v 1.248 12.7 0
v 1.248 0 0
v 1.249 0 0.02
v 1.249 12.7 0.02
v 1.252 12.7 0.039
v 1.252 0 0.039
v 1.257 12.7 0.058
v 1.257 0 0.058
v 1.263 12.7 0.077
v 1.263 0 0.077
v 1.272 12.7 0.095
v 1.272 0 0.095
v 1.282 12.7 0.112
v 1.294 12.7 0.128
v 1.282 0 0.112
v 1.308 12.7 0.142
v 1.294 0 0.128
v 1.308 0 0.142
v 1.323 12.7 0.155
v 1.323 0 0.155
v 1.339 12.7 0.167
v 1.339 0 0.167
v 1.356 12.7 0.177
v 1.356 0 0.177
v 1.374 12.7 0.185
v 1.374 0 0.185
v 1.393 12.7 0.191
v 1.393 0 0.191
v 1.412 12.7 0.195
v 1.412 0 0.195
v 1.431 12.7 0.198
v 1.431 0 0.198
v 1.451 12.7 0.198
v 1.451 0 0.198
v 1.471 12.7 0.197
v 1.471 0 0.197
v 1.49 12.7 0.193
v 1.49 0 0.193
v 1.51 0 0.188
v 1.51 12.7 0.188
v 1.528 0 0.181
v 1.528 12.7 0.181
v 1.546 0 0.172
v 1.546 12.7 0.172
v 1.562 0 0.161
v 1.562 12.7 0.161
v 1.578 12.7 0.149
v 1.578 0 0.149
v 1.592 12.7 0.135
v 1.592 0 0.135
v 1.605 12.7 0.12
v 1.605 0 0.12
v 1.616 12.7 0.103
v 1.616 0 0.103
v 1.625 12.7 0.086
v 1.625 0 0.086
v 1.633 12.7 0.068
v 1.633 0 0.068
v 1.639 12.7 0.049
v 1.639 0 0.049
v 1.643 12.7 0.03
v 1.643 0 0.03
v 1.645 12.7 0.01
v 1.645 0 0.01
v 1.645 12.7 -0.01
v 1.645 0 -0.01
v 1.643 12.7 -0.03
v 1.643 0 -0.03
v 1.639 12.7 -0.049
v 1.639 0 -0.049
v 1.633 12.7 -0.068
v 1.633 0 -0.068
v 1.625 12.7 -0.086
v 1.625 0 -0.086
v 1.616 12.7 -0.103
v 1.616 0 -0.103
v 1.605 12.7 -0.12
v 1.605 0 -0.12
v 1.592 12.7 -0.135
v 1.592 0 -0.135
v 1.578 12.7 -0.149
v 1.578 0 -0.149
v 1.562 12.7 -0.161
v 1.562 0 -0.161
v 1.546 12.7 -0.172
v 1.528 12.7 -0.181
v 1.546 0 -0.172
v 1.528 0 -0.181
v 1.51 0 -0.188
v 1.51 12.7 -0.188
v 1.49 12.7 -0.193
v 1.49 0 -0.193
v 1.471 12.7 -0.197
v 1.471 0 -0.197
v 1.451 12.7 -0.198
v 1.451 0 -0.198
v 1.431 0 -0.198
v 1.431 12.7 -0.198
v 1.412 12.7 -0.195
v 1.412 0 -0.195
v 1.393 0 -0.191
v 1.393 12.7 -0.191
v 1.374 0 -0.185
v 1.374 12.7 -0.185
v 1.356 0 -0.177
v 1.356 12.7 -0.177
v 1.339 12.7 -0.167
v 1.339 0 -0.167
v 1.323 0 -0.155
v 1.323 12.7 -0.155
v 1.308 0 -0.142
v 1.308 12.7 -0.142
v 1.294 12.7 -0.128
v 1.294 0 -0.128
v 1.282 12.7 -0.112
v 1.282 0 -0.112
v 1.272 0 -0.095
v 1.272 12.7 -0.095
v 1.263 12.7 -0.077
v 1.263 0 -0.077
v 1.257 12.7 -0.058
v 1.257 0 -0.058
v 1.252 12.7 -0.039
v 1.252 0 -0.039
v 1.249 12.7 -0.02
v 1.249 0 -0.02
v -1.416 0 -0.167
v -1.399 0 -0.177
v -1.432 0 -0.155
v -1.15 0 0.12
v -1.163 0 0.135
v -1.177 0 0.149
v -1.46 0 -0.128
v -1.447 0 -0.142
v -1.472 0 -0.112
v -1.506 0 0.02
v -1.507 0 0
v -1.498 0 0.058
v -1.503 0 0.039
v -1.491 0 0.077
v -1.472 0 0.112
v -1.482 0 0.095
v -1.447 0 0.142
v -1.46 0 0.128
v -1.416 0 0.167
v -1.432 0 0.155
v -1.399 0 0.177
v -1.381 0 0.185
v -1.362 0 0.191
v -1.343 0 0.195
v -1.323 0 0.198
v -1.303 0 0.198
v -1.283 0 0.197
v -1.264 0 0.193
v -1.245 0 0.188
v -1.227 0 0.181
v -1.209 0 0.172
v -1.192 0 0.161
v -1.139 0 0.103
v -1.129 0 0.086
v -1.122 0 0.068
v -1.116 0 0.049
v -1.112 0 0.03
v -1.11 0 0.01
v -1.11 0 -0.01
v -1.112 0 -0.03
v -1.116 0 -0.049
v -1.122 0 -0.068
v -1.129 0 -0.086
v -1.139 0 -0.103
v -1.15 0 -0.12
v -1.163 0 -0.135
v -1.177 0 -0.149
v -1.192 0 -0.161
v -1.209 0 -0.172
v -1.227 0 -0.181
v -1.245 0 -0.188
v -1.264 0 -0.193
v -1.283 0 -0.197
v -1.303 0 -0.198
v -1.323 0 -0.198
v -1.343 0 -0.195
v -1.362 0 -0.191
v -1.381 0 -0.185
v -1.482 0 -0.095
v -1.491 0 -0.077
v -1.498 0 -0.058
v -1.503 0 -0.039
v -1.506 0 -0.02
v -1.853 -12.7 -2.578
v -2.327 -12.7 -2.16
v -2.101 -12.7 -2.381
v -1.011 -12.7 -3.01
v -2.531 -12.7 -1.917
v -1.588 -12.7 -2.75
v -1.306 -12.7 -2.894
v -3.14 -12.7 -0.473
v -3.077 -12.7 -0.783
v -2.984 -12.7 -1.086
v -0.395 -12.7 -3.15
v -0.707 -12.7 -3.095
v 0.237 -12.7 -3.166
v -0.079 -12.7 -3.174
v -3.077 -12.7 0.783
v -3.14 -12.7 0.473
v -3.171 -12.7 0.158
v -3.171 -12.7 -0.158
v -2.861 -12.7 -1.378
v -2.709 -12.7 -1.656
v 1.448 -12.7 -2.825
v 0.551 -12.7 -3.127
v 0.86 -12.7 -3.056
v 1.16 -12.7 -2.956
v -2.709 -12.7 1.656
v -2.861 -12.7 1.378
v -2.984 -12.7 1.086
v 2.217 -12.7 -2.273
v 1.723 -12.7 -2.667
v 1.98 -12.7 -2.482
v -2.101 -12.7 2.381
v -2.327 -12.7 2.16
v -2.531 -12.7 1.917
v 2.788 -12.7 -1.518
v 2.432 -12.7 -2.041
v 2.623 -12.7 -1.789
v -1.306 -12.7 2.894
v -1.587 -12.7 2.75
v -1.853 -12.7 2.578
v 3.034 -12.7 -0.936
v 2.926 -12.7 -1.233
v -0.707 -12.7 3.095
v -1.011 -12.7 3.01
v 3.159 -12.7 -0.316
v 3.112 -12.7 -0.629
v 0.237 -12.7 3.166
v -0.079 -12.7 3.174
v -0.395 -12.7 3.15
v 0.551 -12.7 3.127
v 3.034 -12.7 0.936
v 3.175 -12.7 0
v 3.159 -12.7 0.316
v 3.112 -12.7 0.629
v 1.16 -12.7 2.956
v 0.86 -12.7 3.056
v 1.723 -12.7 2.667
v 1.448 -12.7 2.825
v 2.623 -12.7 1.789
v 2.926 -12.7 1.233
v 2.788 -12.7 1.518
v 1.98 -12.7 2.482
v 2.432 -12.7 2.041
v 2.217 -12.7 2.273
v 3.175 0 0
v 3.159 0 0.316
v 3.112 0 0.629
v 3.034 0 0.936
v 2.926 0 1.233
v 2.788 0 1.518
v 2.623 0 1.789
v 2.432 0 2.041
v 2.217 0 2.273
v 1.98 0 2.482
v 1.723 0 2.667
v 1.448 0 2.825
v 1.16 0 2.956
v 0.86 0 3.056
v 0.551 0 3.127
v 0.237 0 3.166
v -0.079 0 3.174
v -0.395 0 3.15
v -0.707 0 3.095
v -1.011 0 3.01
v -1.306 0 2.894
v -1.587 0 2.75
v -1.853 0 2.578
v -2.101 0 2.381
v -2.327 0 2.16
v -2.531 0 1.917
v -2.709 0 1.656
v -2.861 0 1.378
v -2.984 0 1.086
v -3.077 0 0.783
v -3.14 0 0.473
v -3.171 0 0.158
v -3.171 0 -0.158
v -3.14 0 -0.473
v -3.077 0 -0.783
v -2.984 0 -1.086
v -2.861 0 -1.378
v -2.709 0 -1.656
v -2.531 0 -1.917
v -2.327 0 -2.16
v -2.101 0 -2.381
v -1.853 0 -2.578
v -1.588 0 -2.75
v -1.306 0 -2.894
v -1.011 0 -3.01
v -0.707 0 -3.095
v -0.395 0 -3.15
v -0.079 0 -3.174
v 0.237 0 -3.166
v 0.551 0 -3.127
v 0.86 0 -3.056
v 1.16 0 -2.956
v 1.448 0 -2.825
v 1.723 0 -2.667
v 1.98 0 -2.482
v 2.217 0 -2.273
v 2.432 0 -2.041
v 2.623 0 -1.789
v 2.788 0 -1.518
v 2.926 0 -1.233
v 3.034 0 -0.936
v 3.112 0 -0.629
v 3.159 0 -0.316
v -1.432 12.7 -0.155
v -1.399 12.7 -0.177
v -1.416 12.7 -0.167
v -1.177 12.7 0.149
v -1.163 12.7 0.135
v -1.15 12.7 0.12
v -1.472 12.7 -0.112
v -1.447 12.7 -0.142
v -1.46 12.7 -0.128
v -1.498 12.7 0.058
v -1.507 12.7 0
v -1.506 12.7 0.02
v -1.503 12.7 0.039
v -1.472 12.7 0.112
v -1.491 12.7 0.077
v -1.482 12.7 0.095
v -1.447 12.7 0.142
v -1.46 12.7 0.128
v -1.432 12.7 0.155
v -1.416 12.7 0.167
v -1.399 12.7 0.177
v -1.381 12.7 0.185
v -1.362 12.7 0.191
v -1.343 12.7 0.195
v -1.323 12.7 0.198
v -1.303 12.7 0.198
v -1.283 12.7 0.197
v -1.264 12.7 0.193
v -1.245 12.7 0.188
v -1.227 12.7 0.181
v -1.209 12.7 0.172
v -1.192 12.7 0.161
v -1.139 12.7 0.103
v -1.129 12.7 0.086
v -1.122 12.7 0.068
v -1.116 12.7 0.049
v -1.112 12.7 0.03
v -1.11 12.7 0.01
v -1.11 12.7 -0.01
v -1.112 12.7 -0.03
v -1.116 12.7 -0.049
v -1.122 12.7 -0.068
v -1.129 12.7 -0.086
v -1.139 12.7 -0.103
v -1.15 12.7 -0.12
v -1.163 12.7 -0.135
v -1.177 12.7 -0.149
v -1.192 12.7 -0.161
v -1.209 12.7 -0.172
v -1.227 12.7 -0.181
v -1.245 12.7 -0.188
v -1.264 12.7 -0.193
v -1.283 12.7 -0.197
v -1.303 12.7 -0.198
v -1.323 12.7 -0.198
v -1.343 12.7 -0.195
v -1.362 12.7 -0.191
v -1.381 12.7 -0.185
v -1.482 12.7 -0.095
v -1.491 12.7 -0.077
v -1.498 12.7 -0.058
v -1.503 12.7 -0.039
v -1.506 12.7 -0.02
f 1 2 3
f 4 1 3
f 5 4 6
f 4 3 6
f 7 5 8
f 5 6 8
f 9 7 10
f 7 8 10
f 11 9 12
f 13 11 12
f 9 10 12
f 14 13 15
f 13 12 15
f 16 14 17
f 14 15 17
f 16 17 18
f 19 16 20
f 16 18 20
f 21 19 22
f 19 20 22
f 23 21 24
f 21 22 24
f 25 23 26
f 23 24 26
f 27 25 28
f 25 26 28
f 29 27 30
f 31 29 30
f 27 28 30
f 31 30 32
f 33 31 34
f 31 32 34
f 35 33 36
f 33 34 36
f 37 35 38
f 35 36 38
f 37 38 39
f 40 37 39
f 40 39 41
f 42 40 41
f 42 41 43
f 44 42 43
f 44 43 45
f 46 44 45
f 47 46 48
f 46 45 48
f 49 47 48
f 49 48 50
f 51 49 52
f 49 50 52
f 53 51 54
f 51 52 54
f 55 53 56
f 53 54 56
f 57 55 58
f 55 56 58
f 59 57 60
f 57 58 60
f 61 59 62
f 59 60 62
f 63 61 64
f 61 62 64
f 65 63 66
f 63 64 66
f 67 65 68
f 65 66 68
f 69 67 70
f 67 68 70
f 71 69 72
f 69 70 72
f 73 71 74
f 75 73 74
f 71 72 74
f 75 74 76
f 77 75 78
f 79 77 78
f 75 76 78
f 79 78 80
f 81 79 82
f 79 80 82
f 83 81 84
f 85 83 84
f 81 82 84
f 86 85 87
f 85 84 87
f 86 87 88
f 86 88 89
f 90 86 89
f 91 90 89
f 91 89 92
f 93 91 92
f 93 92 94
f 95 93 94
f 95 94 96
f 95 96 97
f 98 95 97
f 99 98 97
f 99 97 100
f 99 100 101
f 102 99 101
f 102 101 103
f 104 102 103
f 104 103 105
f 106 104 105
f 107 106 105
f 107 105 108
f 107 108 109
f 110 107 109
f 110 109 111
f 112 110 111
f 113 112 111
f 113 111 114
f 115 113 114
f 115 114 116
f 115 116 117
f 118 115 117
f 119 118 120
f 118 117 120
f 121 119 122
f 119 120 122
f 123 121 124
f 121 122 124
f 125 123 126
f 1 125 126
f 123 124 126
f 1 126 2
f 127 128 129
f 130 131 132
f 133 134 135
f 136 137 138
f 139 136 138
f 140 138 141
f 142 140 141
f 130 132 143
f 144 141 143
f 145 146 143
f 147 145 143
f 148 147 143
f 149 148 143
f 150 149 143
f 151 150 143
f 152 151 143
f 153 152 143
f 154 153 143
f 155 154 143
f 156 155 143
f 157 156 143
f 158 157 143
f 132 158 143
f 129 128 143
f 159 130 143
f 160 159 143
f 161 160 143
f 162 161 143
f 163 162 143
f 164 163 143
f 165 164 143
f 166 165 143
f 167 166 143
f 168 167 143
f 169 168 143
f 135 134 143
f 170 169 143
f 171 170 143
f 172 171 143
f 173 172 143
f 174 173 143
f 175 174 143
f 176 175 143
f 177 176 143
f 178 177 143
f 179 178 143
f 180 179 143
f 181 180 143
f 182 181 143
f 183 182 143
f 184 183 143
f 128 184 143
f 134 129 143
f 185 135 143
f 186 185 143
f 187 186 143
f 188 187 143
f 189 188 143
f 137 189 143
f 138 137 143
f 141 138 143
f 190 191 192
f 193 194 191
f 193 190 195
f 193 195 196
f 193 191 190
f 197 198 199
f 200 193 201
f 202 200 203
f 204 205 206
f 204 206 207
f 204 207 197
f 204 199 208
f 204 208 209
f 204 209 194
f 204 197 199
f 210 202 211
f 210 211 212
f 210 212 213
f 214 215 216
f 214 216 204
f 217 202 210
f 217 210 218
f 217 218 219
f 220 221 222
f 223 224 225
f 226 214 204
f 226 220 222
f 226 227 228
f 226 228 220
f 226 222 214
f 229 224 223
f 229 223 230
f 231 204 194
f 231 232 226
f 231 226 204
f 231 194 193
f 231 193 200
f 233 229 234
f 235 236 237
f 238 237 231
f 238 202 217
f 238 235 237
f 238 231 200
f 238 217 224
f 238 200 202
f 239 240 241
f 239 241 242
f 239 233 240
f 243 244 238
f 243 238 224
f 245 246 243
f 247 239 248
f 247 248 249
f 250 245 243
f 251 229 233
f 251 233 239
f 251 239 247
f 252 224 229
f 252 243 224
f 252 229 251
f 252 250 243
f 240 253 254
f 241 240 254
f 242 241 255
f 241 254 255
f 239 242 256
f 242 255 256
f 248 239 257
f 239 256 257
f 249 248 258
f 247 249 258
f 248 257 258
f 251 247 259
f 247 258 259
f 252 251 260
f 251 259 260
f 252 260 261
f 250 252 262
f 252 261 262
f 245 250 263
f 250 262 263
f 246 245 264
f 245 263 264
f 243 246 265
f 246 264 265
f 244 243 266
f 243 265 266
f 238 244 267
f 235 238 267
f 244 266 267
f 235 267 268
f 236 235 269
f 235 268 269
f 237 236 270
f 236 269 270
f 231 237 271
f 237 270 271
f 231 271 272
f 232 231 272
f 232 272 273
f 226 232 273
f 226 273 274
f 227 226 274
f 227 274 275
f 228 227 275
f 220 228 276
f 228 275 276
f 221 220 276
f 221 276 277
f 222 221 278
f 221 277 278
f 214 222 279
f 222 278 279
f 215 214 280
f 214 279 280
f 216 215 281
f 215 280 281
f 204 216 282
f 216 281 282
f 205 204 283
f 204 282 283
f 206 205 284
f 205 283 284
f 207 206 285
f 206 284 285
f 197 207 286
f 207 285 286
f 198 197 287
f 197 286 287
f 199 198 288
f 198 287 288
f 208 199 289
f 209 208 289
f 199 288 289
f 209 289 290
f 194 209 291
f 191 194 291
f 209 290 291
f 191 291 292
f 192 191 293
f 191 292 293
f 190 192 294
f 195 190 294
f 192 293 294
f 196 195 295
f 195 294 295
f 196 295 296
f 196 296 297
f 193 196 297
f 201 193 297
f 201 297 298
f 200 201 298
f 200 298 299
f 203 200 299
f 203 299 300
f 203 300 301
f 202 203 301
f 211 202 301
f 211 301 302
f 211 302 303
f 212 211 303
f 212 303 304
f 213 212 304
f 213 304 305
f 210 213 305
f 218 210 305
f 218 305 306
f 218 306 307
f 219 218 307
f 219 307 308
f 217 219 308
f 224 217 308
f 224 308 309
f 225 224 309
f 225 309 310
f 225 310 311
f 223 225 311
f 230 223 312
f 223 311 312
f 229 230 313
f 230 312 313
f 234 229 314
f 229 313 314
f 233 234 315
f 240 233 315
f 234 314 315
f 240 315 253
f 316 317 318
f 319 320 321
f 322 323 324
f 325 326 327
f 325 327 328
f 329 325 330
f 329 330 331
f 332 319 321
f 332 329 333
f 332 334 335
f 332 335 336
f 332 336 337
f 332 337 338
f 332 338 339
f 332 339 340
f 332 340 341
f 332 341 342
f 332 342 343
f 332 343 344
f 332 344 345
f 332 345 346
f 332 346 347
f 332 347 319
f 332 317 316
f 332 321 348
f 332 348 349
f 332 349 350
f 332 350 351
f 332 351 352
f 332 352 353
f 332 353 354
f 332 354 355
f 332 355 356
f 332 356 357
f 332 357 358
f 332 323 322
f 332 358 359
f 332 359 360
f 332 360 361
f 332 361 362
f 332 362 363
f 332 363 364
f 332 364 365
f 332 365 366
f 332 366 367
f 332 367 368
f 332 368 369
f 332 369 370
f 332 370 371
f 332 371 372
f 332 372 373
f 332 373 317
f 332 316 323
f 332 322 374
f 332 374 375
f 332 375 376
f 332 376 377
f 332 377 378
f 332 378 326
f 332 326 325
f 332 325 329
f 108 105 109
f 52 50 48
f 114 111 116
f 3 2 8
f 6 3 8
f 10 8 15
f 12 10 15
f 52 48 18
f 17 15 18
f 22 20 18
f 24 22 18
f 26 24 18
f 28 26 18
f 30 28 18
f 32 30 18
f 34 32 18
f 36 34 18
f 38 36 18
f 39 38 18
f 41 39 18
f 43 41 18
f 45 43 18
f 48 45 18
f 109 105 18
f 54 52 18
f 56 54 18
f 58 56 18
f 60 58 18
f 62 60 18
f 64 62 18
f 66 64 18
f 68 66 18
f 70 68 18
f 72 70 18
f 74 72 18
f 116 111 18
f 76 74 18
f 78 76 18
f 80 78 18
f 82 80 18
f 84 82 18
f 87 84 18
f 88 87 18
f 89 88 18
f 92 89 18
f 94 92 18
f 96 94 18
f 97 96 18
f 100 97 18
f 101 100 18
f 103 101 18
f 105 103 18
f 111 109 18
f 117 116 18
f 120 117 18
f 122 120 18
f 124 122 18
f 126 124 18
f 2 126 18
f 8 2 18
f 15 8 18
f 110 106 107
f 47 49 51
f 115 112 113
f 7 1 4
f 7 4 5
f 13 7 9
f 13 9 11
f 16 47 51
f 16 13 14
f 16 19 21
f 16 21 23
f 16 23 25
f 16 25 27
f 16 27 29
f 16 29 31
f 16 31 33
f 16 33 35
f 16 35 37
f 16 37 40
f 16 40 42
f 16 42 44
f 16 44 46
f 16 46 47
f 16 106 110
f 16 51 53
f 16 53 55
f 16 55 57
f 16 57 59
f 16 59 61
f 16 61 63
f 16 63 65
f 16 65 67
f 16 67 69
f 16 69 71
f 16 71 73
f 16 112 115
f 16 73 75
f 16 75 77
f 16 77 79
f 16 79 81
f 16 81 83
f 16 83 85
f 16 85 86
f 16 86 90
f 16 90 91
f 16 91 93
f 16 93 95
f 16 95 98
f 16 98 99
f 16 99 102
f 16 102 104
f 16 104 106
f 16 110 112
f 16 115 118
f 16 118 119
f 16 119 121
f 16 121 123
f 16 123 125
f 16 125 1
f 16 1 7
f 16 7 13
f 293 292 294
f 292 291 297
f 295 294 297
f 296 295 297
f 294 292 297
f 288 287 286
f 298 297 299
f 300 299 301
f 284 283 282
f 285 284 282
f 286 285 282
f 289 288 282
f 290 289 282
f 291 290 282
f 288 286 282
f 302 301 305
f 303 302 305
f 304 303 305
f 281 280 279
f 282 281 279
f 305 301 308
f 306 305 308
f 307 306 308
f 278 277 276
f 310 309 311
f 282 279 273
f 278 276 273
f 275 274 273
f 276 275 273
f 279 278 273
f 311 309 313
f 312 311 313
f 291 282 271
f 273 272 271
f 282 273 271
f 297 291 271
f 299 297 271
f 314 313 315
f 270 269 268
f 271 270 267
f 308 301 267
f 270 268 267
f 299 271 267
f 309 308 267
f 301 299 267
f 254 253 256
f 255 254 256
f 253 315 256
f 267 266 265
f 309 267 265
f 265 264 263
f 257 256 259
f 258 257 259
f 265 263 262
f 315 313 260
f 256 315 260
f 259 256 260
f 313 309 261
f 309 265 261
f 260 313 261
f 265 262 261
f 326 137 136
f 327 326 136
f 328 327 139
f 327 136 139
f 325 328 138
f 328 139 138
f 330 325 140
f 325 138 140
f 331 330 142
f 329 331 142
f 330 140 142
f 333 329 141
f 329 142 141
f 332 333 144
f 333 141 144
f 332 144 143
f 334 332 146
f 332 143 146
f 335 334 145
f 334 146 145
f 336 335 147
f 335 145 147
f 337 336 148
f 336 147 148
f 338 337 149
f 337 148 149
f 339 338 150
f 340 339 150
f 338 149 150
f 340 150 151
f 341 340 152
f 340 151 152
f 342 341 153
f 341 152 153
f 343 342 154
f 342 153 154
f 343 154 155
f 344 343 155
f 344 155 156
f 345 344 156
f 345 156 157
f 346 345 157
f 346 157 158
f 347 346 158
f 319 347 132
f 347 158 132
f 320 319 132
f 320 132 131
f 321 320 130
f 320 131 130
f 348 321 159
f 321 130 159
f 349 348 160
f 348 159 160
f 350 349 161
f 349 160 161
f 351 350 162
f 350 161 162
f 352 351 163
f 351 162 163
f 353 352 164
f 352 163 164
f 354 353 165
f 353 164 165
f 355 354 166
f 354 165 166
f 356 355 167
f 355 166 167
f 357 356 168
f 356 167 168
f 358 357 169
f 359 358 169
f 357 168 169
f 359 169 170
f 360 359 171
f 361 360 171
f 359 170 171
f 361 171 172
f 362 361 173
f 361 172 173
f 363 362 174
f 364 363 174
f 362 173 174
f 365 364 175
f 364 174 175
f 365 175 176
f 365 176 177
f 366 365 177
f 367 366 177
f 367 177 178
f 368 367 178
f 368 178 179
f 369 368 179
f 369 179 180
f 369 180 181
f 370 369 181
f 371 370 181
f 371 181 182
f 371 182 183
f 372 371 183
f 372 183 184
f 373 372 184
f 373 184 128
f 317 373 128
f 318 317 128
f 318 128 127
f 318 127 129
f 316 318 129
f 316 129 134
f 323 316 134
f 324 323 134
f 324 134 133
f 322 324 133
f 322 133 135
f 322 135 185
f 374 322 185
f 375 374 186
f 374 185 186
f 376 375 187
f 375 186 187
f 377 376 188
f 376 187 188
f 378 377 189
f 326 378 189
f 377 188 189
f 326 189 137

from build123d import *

# Parameters (mm, degrees)
F0_R     = 3.175
F1_DEPTH = 12.7
F2_R     = 0.198438
F3_DEPTH = 12.7


with BuildPart() as f1:
    # F0 (on Front) → F1 (new body)
    with BuildSketch(Plane.XZ):
        Circle(F0_R)
    extrude(amount=F1_DEPTH)


with BuildPart() as f3:
    # F2 (on face) → F3 (new body)
    with BuildSketch(Plane(origin=(0, 0, 0), x_dir=(-1, 0, 0), z_dir=(0, 1, 0))):
        with Locations((1.308136, 0)):
            Circle(F2_R)
        with Locations((-1.44632, 0)):
            Circle(F2_R)
    extrude(amount=F3_DEPTH)


solid = Compound([f1.part, f3.part])
